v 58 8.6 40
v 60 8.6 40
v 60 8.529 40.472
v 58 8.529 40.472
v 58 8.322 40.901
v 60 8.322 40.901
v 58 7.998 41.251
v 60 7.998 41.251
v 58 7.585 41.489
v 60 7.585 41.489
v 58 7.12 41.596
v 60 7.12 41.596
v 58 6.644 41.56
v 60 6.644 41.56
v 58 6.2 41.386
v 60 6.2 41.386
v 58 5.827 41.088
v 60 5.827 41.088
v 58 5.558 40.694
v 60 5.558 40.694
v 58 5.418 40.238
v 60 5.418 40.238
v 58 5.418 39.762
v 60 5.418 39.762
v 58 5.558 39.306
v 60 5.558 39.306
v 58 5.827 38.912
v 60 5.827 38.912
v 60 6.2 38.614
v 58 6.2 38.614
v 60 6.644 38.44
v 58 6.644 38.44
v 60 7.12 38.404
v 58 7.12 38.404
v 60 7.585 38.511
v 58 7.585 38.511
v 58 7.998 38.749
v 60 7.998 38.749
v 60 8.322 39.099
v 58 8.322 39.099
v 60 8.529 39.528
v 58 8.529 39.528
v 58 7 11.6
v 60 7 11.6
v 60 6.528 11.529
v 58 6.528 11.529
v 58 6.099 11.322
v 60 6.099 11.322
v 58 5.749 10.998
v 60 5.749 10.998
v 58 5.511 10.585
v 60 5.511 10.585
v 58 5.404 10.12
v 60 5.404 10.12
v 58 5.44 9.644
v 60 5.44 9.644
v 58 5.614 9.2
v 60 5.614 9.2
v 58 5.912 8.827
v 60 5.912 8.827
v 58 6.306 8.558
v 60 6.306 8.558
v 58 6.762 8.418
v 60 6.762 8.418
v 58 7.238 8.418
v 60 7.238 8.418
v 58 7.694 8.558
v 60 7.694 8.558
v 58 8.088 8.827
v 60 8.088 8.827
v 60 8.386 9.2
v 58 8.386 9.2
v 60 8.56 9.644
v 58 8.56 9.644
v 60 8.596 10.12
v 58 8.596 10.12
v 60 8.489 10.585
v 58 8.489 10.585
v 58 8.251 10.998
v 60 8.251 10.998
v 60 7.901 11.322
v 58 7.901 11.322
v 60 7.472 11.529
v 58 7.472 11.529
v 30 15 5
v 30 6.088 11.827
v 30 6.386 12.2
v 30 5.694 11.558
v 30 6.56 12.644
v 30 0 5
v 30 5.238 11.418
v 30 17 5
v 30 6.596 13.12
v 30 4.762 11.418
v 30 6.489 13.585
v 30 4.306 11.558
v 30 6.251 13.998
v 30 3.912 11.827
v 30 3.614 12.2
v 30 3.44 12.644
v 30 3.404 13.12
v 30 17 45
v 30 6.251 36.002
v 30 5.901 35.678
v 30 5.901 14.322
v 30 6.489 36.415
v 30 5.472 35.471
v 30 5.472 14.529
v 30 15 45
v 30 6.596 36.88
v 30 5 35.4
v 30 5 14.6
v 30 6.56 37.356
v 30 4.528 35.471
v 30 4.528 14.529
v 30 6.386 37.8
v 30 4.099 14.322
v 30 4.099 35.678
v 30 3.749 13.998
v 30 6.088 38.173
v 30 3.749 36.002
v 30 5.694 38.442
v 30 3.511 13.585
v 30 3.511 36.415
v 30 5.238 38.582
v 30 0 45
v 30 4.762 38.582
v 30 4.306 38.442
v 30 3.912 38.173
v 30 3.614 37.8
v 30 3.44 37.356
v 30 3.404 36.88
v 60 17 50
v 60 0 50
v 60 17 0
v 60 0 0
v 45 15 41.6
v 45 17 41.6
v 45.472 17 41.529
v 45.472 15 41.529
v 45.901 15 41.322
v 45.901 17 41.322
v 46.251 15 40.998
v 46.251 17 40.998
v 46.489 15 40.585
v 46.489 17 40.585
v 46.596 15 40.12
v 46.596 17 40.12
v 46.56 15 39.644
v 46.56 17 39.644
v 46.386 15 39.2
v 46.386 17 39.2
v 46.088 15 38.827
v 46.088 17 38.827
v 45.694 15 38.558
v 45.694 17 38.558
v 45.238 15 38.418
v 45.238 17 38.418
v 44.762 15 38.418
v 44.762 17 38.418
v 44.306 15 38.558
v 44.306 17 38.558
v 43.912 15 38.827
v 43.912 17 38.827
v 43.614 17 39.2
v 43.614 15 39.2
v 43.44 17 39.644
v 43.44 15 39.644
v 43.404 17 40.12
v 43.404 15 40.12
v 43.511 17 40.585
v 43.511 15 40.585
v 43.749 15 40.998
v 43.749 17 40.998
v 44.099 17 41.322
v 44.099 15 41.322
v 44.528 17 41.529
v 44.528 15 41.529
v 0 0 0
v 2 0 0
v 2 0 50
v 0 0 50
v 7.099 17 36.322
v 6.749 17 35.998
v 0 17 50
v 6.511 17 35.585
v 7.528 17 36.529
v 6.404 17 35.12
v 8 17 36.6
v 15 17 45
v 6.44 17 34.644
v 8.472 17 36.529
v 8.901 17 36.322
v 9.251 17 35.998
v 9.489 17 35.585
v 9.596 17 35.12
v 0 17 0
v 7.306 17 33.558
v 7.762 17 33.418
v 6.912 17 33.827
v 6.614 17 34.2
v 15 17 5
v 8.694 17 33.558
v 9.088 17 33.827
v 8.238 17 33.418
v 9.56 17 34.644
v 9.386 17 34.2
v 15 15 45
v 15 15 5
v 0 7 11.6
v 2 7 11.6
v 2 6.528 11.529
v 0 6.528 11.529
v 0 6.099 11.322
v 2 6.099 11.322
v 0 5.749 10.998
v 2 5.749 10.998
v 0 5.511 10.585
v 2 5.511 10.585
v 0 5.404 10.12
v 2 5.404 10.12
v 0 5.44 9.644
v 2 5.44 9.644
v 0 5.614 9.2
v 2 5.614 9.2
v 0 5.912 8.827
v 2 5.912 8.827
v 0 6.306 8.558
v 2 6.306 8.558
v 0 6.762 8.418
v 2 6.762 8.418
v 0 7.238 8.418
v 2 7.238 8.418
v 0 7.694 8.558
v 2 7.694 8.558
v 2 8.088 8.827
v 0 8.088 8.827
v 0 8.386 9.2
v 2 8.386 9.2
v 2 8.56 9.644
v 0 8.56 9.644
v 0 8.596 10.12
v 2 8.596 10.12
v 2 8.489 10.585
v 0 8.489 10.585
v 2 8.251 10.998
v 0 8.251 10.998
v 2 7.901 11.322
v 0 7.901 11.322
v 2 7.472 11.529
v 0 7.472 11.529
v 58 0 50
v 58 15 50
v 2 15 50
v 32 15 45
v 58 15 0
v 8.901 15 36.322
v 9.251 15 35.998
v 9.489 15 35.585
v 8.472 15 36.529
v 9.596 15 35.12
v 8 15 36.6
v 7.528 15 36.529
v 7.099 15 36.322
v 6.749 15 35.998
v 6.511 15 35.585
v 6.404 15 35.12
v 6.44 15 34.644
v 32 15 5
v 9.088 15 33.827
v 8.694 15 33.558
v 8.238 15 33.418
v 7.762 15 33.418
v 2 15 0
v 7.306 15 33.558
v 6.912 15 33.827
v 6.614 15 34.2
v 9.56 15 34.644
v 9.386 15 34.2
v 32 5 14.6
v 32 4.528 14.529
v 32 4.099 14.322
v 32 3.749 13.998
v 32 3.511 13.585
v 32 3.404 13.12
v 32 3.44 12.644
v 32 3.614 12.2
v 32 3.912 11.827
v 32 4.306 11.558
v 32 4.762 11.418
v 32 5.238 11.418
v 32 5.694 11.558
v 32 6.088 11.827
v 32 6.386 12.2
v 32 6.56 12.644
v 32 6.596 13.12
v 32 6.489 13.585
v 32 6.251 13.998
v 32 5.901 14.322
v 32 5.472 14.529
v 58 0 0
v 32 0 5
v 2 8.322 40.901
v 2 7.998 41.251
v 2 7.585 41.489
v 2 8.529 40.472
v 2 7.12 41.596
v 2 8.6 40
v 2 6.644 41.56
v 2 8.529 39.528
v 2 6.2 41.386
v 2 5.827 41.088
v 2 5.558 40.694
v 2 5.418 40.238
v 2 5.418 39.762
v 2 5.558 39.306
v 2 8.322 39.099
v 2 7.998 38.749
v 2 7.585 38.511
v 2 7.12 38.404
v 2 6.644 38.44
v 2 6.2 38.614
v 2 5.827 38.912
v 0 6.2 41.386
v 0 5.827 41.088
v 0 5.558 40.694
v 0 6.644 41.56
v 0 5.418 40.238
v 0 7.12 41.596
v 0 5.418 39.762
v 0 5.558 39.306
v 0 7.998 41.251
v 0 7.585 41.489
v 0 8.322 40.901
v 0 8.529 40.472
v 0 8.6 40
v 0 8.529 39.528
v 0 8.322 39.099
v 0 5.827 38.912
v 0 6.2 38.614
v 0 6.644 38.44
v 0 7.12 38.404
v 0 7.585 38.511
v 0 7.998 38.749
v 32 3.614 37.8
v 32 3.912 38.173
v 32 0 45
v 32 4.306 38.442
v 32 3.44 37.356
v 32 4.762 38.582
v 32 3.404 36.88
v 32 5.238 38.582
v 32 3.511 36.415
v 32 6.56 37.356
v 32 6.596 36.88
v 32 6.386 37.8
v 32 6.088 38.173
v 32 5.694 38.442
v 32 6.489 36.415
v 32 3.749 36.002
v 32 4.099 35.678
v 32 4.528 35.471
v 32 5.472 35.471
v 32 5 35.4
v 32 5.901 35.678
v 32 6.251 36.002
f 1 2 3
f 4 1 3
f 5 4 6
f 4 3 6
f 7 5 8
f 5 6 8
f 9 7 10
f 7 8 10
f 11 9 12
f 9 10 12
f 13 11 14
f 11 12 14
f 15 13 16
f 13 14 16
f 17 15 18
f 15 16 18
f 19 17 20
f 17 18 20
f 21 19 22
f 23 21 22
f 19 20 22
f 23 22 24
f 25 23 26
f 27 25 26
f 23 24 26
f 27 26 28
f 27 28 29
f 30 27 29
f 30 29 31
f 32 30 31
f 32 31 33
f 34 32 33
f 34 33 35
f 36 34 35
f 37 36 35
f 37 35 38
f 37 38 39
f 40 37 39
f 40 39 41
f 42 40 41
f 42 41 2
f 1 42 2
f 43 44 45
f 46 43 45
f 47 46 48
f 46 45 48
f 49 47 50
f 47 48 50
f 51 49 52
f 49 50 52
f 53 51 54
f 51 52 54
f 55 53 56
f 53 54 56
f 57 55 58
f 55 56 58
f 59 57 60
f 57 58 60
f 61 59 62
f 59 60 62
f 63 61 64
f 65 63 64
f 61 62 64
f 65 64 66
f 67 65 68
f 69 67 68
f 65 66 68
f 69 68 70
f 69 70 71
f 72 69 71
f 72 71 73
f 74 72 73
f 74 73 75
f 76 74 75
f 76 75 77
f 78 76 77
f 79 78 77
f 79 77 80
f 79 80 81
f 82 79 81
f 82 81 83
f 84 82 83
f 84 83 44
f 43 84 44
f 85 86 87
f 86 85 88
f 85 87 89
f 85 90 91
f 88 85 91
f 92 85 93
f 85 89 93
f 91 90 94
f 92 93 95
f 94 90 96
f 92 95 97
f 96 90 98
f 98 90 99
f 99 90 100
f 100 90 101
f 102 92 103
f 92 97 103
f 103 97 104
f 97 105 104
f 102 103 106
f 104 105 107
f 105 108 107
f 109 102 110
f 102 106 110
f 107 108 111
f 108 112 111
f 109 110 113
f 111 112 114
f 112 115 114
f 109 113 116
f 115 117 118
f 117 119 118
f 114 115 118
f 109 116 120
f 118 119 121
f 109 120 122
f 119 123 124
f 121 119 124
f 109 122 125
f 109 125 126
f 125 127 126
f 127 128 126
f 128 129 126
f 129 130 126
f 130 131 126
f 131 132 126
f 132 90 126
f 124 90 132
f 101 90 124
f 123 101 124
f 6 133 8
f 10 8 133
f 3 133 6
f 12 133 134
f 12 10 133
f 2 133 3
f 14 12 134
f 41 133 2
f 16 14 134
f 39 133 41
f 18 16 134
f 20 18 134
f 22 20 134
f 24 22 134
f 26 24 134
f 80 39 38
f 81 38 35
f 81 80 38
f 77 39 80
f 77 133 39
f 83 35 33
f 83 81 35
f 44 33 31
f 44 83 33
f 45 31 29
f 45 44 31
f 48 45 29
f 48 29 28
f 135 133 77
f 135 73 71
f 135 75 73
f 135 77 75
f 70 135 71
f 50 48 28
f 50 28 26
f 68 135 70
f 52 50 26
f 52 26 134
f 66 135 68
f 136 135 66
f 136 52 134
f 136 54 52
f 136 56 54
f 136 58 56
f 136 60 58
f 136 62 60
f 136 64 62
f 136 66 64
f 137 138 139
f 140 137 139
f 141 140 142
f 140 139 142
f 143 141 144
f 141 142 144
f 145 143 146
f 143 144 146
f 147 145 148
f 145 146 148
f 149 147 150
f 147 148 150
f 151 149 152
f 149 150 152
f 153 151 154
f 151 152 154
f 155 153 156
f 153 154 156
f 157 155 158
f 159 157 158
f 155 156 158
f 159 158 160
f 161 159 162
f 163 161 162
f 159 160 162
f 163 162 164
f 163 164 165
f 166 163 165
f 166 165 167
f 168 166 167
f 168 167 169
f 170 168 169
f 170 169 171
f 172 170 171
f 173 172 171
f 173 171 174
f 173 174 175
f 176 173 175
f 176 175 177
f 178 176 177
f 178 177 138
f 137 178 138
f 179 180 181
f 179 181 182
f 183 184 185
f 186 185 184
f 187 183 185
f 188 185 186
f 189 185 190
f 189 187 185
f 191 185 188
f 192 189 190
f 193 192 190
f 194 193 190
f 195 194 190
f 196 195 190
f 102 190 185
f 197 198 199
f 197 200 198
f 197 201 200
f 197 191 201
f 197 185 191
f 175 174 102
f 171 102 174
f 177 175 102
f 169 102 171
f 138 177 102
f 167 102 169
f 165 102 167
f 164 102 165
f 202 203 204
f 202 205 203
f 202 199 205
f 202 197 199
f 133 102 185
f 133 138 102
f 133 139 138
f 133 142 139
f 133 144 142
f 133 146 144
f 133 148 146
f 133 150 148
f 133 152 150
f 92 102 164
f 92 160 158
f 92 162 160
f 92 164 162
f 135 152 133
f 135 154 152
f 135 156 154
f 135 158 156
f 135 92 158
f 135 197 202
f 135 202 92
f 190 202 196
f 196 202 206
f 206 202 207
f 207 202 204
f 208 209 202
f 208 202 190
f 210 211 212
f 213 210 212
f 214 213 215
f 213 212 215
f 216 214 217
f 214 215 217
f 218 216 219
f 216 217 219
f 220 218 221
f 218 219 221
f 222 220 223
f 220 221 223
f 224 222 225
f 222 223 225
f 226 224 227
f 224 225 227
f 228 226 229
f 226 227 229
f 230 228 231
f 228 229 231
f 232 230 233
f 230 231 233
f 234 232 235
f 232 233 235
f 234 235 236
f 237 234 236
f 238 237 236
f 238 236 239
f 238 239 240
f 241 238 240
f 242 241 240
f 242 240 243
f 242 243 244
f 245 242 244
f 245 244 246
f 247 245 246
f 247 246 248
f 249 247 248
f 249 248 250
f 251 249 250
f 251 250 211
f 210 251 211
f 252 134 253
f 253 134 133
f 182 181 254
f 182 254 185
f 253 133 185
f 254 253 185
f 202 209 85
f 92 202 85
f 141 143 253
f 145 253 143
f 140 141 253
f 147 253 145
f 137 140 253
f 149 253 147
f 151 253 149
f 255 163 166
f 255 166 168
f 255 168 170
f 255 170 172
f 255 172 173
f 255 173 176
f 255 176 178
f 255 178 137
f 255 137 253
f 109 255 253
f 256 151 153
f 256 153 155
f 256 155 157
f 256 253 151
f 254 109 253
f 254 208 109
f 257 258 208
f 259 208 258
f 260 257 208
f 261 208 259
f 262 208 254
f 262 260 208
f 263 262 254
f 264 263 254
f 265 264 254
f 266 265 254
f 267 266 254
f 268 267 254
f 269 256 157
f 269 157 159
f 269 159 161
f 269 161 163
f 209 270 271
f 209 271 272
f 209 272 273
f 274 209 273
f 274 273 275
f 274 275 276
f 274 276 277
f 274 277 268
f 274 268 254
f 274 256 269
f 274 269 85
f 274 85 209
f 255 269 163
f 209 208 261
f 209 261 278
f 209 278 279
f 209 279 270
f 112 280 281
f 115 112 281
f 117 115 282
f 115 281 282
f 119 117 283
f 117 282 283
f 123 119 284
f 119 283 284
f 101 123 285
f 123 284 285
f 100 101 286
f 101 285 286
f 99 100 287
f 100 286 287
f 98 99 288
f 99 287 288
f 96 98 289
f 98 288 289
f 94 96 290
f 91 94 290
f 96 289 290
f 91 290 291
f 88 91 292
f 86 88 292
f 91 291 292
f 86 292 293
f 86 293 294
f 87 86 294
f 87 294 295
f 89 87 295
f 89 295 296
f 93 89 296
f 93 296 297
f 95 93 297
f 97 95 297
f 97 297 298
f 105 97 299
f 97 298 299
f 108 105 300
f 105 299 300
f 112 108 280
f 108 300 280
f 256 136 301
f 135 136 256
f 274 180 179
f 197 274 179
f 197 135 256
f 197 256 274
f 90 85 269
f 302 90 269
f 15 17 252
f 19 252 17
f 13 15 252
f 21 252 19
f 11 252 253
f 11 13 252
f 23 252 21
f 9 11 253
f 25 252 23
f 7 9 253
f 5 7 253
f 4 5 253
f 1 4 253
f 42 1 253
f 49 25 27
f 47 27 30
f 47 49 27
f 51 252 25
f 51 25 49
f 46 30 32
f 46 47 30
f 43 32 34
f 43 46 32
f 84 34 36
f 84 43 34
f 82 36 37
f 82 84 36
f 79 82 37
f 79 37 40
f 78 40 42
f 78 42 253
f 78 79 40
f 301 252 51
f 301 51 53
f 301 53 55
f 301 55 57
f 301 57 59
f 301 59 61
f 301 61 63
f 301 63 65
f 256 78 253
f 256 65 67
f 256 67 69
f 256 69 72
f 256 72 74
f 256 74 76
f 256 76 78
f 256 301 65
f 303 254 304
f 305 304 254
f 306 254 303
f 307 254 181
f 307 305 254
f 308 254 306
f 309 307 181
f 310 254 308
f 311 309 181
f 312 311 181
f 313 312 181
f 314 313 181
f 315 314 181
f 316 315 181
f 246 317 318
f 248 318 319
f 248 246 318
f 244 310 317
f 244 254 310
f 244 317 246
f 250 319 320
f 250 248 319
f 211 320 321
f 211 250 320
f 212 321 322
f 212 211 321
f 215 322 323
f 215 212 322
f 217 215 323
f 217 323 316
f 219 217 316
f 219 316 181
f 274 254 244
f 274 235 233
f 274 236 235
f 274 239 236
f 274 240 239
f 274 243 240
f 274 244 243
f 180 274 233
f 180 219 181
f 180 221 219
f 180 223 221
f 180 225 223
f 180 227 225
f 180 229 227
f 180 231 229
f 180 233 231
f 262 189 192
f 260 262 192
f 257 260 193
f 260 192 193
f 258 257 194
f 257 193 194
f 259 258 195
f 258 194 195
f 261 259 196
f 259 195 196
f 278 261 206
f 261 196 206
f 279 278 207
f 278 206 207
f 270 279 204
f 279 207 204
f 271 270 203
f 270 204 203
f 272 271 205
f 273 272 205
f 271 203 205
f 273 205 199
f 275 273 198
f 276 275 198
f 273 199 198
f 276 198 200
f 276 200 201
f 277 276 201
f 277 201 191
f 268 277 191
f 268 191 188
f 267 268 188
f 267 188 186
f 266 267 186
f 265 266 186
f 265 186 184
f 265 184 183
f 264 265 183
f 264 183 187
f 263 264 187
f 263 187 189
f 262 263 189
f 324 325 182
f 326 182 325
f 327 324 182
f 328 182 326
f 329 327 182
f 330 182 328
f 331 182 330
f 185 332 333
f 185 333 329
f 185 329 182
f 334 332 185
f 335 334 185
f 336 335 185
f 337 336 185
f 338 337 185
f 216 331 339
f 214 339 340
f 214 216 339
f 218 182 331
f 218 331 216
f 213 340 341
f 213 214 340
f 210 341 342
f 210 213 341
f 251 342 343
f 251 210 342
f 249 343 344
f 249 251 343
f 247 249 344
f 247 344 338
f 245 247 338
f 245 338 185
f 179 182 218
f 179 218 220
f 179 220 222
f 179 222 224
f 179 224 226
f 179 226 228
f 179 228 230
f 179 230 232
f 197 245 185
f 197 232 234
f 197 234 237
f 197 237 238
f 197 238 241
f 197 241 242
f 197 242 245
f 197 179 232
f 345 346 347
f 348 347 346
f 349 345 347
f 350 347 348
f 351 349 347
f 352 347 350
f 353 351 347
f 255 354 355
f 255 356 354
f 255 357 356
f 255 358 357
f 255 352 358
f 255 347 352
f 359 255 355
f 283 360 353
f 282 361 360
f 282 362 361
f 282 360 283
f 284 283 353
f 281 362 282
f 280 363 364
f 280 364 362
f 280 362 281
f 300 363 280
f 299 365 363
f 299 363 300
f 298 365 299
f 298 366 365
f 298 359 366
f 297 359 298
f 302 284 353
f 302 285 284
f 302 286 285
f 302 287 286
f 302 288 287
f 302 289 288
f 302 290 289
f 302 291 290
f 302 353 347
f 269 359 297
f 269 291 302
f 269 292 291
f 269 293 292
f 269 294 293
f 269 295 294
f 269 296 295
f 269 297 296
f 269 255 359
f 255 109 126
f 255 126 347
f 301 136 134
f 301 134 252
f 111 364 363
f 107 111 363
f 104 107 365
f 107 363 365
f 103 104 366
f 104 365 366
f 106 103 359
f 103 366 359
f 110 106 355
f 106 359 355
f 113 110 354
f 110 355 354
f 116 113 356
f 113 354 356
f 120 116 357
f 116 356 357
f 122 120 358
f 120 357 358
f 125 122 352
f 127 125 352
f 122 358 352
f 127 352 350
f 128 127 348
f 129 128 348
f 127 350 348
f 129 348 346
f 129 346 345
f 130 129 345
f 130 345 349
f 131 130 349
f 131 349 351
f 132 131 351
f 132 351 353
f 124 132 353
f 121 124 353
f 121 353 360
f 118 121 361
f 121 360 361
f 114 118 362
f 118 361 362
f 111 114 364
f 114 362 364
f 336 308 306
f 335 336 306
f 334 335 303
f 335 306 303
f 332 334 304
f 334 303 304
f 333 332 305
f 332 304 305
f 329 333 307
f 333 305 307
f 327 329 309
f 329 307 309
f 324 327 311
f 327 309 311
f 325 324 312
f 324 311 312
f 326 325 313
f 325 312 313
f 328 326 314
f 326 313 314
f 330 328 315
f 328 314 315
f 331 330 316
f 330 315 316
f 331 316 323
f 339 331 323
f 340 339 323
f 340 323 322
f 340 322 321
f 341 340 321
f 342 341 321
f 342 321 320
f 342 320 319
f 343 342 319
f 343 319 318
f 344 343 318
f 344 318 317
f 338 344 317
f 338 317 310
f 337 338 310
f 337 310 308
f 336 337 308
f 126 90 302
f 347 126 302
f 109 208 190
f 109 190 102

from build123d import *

# Parameters (mm, degrees)
BOSS_EXTRUDE1_DEPTH = 50
SKETCH2_R           = 1.6
CUT_EXTRUDE1_DEPTH  = 80.931220434
SKETCH3_W           = 2
SKETCH3_H           = 40
BOSS_EXTRUDE2_DEPTH = 17
SKETCH5_R           = 1.6
CUT_EXTRUDE3_DEPTH  = 2
SKETCH6_R           = 1.6
CUT_EXTRUDE4_DEPTH  = 80.931220434
SKETCH7_W           = 15
SKETCH7_H           = 40
CUT_EXTRUDE5_DEPTH  = 2


with BuildPart() as part:
    # Sketch1 → Boss-Extrude1 (new body)
    with BuildSketch(Plane.XY):
        Polygon((0, 0), (0, 17), (60, 17), (60, 0), (58, 0), (58, 15), (2, 15), (2, 0), align=None)
    extrude(amount=BOSS_EXTRUDE1_DEPTH)

    # Sketch2 → Cut-Extrude1 (cut, through all)
    with BuildSketch(Plane(origin=(60, 0, 0), x_dir=(0, 0, -1), z_dir=(1, 0, 0))):
        with Locations(Location((-40, 7, 0), (0, 0, 90))):
            Circle(SKETCH2_R)
        with Locations(Location((-10, 7, 0), (0, 0, 180))):
            Circle(SKETCH2_R)
    extrude(amount=-CUT_EXTRUDE1_DEPTH, mode=Mode.SUBTRACT)

    # Sketch3 → Boss-Extrude2 (add)
    with BuildSketch(Plane(origin=(0, 17, 0), x_dir=(1, 0, 0), z_dir=(0, 1, 0))):
        with Locations((31, -25)):
            Rectangle(SKETCH3_W, SKETCH3_H)
    extrude(amount=-BOSS_EXTRUDE2_DEPTH)

    # Sketch5 → Cut-Extrude3 (cut)
    with BuildSketch(Plane(origin=(32, 0, 0), x_dir=(0, 0, -1), z_dir=(1, 0, 0))):
        with Locations((-37, 5)):
            Circle(SKETCH5_R)
        with Locations(Location((-13, 5, 0), (0, 0, 180))):
            Circle(SKETCH5_R)
    extrude(amount=-CUT_EXTRUDE3_DEPTH, mode=Mode.SUBTRACT)

    # Sketch6 → Cut-Extrude4 (cut, through all)
    with BuildSketch(Plane(origin=(0, 17, 0), x_dir=(1, 0, 0), z_dir=(0, 1, 0))):
        with Locations(Location((45, -40, 0), (0, 0, 270))):
            Circle(SKETCH6_R)
        with Locations(Location((8, -35, 0), (0, 0, 270))):
            Circle(SKETCH6_R)
    extrude(amount=-CUT_EXTRUDE4_DEPTH, mode=Mode.SUBTRACT)

    # Sketch7 → Cut-Extrude5 (cut)
    with BuildSketch(Plane.XZ.offset(-15)):
        with Locations((22.5, 25)):
            Rectangle(SKETCH7_W, SKETCH7_H)
    extrude(amount=-CUT_EXTRUDE5_DEPTH, mode=Mode.SUBTRACT)


solid = part.part
